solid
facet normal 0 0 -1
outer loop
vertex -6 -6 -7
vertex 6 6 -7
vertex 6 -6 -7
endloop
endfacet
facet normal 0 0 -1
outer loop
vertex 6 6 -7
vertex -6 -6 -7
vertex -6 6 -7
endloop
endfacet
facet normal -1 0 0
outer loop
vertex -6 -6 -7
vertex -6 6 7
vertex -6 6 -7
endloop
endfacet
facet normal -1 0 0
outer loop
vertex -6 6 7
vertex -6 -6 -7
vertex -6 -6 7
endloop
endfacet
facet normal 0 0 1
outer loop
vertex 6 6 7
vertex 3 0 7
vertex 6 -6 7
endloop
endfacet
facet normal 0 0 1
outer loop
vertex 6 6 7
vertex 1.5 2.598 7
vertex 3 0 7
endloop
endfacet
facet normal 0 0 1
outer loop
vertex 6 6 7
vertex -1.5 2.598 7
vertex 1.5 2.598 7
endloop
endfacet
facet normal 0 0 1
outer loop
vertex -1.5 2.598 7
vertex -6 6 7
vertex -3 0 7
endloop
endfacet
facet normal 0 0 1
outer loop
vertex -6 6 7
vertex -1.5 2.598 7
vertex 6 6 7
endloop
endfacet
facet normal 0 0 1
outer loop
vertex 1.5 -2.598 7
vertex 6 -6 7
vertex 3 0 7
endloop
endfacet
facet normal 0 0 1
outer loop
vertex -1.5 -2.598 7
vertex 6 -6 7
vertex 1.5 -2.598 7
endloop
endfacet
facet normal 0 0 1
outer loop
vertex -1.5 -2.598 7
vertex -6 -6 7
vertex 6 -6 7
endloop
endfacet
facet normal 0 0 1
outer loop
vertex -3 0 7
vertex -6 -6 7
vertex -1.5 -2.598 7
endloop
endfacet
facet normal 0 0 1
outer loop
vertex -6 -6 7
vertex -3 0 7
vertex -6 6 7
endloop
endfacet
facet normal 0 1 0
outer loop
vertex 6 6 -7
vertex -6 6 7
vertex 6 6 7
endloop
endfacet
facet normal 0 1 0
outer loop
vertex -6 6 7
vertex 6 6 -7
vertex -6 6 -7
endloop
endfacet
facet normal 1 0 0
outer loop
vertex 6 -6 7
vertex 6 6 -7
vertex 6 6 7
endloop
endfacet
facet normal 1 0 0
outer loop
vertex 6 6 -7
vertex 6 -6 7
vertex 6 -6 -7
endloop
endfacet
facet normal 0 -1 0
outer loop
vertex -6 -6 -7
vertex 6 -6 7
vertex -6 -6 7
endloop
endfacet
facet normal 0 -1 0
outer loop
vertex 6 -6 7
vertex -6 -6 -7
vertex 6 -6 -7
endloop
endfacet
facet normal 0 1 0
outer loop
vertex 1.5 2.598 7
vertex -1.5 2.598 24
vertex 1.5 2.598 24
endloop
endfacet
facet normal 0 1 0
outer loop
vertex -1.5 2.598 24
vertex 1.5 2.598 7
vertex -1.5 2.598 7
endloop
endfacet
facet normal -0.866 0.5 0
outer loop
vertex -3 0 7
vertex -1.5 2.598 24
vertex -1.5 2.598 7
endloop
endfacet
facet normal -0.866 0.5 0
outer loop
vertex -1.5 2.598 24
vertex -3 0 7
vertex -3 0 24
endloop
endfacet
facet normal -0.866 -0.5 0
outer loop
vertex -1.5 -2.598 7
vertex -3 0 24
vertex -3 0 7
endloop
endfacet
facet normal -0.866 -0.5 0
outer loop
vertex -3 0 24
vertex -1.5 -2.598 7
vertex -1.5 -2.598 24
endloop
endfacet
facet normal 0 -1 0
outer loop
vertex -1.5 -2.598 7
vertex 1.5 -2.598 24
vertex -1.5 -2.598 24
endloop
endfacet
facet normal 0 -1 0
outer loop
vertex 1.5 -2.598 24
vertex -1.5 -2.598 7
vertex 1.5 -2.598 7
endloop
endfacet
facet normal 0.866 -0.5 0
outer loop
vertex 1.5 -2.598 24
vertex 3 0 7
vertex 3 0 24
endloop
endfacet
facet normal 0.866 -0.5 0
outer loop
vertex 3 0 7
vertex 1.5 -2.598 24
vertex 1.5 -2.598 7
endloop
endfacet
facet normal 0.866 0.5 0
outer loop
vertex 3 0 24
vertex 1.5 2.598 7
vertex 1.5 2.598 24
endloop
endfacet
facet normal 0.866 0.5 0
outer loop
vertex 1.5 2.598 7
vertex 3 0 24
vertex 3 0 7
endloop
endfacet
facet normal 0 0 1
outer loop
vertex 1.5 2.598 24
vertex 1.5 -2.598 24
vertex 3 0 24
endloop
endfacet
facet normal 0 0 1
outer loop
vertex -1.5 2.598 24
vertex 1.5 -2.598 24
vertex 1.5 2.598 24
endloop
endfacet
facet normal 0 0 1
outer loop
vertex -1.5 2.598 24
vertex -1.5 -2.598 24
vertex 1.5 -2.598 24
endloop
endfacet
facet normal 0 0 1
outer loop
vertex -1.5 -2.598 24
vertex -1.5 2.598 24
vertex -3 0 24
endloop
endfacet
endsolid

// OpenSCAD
// Global constants
$fn=64;

detail();

module detail() {
    linear_extrude(height = 14, center = true) {
        square(size=12, center = true);        
    }
    translate([0, 0, 14])
        linear_extrude(height = 20, center = true) {
            circle(r=3, $fn=6);
        }
    
}
